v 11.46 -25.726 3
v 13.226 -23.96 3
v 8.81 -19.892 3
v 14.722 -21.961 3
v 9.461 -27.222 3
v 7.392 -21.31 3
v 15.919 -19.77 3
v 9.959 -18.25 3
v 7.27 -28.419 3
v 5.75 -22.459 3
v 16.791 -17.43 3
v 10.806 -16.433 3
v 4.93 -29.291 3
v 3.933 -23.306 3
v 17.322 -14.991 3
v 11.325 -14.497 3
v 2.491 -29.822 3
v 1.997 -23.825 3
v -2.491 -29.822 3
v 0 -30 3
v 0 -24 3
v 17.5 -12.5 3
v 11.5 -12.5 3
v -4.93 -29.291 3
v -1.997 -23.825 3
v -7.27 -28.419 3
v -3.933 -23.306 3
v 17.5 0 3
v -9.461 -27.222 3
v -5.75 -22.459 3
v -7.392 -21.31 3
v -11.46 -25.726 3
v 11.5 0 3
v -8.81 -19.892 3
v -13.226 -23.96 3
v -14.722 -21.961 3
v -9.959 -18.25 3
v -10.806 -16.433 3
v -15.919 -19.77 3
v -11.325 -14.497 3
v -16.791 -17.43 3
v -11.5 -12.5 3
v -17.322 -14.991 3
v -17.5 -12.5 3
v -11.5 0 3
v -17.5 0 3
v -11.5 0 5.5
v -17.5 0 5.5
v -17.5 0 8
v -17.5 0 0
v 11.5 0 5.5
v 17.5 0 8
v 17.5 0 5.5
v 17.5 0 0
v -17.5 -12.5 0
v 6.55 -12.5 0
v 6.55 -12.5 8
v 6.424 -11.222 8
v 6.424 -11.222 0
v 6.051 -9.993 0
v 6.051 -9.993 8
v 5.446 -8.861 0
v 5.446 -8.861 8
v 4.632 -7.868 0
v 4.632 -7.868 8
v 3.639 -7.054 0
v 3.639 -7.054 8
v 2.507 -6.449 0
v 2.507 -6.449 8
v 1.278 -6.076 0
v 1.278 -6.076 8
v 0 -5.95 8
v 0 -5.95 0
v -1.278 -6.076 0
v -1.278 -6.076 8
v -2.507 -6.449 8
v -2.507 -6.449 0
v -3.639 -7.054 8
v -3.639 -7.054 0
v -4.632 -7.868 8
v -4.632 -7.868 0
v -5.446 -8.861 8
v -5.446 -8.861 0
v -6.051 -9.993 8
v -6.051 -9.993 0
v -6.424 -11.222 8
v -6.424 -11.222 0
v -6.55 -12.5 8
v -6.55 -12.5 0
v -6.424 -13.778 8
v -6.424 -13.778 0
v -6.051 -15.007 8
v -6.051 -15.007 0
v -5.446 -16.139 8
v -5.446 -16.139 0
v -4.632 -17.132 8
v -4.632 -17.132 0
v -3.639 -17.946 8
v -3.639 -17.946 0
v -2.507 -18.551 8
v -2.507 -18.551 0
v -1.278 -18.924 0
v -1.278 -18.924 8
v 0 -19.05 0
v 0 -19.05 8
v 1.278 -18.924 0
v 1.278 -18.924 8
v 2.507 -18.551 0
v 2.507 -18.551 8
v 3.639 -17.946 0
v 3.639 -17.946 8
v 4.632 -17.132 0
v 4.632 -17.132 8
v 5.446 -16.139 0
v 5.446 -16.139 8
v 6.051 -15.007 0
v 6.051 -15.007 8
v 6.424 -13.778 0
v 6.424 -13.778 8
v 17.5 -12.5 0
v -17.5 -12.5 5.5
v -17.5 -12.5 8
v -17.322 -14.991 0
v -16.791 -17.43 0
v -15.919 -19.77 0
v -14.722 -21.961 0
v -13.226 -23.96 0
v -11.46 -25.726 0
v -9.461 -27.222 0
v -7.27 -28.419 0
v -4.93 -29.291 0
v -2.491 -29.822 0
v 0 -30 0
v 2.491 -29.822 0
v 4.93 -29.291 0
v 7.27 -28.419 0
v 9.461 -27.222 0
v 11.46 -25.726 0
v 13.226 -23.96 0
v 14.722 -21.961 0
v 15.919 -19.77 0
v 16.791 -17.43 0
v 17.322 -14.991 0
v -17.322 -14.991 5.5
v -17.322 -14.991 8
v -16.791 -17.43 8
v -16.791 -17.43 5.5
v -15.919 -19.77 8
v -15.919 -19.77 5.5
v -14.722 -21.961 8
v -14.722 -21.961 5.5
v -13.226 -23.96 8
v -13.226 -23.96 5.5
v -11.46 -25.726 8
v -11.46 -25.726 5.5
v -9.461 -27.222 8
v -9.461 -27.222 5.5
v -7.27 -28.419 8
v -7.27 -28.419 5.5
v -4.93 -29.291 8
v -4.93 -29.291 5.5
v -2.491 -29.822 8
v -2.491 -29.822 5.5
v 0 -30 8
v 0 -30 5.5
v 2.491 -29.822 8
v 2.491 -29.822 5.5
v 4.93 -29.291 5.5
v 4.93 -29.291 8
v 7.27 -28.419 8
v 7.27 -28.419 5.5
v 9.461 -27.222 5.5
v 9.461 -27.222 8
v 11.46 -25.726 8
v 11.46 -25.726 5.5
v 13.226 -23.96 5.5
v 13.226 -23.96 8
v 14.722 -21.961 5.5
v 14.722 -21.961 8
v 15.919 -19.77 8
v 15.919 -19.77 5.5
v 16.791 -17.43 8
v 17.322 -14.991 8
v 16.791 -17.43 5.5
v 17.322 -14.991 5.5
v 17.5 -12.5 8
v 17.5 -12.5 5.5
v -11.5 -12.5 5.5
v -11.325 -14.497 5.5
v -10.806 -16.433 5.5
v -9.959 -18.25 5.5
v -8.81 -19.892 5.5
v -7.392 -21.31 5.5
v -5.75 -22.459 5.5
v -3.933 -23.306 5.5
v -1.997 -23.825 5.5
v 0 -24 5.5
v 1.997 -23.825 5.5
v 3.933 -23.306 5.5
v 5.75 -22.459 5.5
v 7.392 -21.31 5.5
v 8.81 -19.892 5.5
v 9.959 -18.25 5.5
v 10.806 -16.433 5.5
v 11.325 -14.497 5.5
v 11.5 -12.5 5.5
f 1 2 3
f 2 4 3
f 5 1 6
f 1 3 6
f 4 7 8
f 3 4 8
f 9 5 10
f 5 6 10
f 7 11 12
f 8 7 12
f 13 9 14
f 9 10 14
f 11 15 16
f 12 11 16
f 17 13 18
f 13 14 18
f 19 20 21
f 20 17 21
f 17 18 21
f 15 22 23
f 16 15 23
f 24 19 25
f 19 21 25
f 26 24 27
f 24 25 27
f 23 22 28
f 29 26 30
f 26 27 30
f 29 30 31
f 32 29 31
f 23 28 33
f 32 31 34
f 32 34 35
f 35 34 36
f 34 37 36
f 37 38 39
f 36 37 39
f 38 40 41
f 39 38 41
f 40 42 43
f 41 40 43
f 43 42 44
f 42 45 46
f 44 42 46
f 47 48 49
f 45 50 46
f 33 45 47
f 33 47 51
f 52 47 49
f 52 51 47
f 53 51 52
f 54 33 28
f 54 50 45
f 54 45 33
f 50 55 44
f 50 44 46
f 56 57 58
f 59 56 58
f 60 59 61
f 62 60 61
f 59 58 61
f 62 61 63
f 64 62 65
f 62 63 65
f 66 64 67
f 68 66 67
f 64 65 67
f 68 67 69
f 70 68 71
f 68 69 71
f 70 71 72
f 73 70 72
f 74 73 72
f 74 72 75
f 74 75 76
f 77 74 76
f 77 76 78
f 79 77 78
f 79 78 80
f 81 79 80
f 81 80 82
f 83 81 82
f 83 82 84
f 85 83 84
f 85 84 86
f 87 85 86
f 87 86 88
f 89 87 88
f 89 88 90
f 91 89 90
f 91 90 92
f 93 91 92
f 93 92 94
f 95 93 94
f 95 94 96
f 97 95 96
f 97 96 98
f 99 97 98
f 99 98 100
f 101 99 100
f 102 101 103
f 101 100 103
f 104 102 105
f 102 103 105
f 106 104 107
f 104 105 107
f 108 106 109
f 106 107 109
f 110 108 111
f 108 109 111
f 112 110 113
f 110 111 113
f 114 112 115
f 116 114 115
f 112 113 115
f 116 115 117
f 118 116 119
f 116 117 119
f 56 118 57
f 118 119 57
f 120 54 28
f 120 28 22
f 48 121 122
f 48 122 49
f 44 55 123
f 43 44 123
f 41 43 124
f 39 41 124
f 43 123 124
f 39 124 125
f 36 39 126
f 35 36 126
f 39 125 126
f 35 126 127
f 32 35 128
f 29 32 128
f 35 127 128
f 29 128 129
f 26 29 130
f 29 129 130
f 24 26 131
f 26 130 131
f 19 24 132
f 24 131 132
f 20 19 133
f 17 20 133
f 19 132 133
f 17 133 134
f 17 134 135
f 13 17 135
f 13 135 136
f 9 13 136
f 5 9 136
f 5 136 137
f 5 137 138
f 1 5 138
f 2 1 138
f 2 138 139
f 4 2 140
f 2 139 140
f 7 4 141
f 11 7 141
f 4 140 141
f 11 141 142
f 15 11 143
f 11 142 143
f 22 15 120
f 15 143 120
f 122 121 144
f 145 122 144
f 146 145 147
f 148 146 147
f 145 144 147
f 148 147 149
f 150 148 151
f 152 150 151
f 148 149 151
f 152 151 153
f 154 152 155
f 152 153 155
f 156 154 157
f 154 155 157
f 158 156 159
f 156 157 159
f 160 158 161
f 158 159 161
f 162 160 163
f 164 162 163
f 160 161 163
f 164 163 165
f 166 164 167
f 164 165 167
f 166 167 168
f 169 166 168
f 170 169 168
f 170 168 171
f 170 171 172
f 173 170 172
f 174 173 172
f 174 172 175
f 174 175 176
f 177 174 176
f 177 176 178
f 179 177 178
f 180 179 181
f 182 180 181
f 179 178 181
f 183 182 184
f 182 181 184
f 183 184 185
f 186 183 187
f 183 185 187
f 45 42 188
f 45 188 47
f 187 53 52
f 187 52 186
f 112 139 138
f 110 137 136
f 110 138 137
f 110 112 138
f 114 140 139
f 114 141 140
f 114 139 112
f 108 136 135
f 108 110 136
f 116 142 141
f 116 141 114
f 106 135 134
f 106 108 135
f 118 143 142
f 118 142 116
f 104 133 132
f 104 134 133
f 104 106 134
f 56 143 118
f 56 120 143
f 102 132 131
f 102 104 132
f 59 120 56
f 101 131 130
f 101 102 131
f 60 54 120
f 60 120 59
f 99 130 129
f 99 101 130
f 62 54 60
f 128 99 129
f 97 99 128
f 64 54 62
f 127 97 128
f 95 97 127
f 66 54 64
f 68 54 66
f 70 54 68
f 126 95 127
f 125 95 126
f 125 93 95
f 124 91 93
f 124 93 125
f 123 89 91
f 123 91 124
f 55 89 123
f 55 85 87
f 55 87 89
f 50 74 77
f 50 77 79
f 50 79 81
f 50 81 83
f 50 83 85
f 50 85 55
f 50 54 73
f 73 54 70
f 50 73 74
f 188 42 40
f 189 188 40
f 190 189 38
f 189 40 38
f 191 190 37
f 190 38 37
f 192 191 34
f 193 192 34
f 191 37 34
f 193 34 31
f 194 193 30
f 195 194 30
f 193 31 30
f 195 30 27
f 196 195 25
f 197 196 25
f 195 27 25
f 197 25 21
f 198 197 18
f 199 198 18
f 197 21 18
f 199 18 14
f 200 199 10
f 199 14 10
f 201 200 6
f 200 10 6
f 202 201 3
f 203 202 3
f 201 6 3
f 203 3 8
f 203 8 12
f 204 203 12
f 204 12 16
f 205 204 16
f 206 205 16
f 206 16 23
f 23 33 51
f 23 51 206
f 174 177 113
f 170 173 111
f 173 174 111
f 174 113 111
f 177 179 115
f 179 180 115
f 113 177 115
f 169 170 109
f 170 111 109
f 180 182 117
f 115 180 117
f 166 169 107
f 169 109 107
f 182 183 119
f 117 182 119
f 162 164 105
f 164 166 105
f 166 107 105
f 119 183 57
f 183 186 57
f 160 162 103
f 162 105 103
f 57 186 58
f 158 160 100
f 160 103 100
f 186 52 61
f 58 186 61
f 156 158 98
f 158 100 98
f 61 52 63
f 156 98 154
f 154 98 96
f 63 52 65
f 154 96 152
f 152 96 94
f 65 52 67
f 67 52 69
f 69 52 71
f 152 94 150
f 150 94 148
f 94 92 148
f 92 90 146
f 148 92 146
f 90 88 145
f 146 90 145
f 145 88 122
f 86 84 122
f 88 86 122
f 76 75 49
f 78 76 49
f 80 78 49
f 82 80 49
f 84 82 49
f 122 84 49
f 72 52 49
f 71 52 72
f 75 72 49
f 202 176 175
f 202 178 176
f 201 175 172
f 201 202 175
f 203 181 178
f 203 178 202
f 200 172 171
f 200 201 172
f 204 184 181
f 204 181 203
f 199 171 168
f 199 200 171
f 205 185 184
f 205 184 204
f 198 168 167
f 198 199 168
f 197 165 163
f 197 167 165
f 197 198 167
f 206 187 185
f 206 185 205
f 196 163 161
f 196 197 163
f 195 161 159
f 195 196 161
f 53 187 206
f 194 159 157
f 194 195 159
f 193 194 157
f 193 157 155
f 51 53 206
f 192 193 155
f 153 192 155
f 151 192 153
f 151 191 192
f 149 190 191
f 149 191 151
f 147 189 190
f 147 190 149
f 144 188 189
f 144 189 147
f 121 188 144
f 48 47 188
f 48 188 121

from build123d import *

# Parameters (mm, degrees)
PAD_DEPTH    = 3
PAD001_DEPTH = 2.5
PAD002_DEPTH = 2.5
SKETCH004_R  = 6.55
POCKET_DEPTH = 8.001


with BuildPart() as part:
    # Sketch001 → Pad (new body)
    with BuildSketch(Plane.XY):
        with BuildLine():
            Line((-17.5, 0), (17.5, 0))
            Line((17.5, 0), (17.5, -12.5))
            ThreePointArc((-17.5, -12.5), (0, -30), (17.5, -12.5))
            Line((-17.5, -12.5), (-17.5, 0))
        make_face()
    extrude(amount=PAD_DEPTH)

    # Sketch002 (on Face6 of Pad) → Pad001 (join)
    with BuildSketch(Plane.XY.offset(3)):
        with BuildLine():
            Line((11.5, 0), (11.5, -12.5))
            ThreePointArc((-11.5, -12.5), (0, -24), (11.5, -12.5))
            Line((-11.5, -12.5), (-11.5, 0))
            Line((-11.5, 0), (11.5, 0))
        make_face()
    extrude(amount=PAD001_DEPTH)

    # Sketch003 (on Face9 of Pad001) → Pad002 (join)
    with BuildSketch(Plane.XY.offset(5.5)):
        with BuildLine():
            Line((-17.5, 0), (17.5, 0))
            Line((17.5, 0), (17.5, -12.5))
            ThreePointArc((-17.5, -12.5), (0, -30), (17.5, -12.5))
            Line((-17.5, -12.5), (-17.5, 0))
        make_face()
    extrude(amount=PAD002_DEPTH)

    # Sketch004 (on Face12 of Pad002) → Pocket (cut, through all)
    with BuildSketch(Plane.XY.offset(8)):
        with Locations((0, -12.5)):
            Circle(SKETCH004_R)
    extrude(amount=-POCKET_DEPTH, mode=Mode.SUBTRACT)


solid = part.part
